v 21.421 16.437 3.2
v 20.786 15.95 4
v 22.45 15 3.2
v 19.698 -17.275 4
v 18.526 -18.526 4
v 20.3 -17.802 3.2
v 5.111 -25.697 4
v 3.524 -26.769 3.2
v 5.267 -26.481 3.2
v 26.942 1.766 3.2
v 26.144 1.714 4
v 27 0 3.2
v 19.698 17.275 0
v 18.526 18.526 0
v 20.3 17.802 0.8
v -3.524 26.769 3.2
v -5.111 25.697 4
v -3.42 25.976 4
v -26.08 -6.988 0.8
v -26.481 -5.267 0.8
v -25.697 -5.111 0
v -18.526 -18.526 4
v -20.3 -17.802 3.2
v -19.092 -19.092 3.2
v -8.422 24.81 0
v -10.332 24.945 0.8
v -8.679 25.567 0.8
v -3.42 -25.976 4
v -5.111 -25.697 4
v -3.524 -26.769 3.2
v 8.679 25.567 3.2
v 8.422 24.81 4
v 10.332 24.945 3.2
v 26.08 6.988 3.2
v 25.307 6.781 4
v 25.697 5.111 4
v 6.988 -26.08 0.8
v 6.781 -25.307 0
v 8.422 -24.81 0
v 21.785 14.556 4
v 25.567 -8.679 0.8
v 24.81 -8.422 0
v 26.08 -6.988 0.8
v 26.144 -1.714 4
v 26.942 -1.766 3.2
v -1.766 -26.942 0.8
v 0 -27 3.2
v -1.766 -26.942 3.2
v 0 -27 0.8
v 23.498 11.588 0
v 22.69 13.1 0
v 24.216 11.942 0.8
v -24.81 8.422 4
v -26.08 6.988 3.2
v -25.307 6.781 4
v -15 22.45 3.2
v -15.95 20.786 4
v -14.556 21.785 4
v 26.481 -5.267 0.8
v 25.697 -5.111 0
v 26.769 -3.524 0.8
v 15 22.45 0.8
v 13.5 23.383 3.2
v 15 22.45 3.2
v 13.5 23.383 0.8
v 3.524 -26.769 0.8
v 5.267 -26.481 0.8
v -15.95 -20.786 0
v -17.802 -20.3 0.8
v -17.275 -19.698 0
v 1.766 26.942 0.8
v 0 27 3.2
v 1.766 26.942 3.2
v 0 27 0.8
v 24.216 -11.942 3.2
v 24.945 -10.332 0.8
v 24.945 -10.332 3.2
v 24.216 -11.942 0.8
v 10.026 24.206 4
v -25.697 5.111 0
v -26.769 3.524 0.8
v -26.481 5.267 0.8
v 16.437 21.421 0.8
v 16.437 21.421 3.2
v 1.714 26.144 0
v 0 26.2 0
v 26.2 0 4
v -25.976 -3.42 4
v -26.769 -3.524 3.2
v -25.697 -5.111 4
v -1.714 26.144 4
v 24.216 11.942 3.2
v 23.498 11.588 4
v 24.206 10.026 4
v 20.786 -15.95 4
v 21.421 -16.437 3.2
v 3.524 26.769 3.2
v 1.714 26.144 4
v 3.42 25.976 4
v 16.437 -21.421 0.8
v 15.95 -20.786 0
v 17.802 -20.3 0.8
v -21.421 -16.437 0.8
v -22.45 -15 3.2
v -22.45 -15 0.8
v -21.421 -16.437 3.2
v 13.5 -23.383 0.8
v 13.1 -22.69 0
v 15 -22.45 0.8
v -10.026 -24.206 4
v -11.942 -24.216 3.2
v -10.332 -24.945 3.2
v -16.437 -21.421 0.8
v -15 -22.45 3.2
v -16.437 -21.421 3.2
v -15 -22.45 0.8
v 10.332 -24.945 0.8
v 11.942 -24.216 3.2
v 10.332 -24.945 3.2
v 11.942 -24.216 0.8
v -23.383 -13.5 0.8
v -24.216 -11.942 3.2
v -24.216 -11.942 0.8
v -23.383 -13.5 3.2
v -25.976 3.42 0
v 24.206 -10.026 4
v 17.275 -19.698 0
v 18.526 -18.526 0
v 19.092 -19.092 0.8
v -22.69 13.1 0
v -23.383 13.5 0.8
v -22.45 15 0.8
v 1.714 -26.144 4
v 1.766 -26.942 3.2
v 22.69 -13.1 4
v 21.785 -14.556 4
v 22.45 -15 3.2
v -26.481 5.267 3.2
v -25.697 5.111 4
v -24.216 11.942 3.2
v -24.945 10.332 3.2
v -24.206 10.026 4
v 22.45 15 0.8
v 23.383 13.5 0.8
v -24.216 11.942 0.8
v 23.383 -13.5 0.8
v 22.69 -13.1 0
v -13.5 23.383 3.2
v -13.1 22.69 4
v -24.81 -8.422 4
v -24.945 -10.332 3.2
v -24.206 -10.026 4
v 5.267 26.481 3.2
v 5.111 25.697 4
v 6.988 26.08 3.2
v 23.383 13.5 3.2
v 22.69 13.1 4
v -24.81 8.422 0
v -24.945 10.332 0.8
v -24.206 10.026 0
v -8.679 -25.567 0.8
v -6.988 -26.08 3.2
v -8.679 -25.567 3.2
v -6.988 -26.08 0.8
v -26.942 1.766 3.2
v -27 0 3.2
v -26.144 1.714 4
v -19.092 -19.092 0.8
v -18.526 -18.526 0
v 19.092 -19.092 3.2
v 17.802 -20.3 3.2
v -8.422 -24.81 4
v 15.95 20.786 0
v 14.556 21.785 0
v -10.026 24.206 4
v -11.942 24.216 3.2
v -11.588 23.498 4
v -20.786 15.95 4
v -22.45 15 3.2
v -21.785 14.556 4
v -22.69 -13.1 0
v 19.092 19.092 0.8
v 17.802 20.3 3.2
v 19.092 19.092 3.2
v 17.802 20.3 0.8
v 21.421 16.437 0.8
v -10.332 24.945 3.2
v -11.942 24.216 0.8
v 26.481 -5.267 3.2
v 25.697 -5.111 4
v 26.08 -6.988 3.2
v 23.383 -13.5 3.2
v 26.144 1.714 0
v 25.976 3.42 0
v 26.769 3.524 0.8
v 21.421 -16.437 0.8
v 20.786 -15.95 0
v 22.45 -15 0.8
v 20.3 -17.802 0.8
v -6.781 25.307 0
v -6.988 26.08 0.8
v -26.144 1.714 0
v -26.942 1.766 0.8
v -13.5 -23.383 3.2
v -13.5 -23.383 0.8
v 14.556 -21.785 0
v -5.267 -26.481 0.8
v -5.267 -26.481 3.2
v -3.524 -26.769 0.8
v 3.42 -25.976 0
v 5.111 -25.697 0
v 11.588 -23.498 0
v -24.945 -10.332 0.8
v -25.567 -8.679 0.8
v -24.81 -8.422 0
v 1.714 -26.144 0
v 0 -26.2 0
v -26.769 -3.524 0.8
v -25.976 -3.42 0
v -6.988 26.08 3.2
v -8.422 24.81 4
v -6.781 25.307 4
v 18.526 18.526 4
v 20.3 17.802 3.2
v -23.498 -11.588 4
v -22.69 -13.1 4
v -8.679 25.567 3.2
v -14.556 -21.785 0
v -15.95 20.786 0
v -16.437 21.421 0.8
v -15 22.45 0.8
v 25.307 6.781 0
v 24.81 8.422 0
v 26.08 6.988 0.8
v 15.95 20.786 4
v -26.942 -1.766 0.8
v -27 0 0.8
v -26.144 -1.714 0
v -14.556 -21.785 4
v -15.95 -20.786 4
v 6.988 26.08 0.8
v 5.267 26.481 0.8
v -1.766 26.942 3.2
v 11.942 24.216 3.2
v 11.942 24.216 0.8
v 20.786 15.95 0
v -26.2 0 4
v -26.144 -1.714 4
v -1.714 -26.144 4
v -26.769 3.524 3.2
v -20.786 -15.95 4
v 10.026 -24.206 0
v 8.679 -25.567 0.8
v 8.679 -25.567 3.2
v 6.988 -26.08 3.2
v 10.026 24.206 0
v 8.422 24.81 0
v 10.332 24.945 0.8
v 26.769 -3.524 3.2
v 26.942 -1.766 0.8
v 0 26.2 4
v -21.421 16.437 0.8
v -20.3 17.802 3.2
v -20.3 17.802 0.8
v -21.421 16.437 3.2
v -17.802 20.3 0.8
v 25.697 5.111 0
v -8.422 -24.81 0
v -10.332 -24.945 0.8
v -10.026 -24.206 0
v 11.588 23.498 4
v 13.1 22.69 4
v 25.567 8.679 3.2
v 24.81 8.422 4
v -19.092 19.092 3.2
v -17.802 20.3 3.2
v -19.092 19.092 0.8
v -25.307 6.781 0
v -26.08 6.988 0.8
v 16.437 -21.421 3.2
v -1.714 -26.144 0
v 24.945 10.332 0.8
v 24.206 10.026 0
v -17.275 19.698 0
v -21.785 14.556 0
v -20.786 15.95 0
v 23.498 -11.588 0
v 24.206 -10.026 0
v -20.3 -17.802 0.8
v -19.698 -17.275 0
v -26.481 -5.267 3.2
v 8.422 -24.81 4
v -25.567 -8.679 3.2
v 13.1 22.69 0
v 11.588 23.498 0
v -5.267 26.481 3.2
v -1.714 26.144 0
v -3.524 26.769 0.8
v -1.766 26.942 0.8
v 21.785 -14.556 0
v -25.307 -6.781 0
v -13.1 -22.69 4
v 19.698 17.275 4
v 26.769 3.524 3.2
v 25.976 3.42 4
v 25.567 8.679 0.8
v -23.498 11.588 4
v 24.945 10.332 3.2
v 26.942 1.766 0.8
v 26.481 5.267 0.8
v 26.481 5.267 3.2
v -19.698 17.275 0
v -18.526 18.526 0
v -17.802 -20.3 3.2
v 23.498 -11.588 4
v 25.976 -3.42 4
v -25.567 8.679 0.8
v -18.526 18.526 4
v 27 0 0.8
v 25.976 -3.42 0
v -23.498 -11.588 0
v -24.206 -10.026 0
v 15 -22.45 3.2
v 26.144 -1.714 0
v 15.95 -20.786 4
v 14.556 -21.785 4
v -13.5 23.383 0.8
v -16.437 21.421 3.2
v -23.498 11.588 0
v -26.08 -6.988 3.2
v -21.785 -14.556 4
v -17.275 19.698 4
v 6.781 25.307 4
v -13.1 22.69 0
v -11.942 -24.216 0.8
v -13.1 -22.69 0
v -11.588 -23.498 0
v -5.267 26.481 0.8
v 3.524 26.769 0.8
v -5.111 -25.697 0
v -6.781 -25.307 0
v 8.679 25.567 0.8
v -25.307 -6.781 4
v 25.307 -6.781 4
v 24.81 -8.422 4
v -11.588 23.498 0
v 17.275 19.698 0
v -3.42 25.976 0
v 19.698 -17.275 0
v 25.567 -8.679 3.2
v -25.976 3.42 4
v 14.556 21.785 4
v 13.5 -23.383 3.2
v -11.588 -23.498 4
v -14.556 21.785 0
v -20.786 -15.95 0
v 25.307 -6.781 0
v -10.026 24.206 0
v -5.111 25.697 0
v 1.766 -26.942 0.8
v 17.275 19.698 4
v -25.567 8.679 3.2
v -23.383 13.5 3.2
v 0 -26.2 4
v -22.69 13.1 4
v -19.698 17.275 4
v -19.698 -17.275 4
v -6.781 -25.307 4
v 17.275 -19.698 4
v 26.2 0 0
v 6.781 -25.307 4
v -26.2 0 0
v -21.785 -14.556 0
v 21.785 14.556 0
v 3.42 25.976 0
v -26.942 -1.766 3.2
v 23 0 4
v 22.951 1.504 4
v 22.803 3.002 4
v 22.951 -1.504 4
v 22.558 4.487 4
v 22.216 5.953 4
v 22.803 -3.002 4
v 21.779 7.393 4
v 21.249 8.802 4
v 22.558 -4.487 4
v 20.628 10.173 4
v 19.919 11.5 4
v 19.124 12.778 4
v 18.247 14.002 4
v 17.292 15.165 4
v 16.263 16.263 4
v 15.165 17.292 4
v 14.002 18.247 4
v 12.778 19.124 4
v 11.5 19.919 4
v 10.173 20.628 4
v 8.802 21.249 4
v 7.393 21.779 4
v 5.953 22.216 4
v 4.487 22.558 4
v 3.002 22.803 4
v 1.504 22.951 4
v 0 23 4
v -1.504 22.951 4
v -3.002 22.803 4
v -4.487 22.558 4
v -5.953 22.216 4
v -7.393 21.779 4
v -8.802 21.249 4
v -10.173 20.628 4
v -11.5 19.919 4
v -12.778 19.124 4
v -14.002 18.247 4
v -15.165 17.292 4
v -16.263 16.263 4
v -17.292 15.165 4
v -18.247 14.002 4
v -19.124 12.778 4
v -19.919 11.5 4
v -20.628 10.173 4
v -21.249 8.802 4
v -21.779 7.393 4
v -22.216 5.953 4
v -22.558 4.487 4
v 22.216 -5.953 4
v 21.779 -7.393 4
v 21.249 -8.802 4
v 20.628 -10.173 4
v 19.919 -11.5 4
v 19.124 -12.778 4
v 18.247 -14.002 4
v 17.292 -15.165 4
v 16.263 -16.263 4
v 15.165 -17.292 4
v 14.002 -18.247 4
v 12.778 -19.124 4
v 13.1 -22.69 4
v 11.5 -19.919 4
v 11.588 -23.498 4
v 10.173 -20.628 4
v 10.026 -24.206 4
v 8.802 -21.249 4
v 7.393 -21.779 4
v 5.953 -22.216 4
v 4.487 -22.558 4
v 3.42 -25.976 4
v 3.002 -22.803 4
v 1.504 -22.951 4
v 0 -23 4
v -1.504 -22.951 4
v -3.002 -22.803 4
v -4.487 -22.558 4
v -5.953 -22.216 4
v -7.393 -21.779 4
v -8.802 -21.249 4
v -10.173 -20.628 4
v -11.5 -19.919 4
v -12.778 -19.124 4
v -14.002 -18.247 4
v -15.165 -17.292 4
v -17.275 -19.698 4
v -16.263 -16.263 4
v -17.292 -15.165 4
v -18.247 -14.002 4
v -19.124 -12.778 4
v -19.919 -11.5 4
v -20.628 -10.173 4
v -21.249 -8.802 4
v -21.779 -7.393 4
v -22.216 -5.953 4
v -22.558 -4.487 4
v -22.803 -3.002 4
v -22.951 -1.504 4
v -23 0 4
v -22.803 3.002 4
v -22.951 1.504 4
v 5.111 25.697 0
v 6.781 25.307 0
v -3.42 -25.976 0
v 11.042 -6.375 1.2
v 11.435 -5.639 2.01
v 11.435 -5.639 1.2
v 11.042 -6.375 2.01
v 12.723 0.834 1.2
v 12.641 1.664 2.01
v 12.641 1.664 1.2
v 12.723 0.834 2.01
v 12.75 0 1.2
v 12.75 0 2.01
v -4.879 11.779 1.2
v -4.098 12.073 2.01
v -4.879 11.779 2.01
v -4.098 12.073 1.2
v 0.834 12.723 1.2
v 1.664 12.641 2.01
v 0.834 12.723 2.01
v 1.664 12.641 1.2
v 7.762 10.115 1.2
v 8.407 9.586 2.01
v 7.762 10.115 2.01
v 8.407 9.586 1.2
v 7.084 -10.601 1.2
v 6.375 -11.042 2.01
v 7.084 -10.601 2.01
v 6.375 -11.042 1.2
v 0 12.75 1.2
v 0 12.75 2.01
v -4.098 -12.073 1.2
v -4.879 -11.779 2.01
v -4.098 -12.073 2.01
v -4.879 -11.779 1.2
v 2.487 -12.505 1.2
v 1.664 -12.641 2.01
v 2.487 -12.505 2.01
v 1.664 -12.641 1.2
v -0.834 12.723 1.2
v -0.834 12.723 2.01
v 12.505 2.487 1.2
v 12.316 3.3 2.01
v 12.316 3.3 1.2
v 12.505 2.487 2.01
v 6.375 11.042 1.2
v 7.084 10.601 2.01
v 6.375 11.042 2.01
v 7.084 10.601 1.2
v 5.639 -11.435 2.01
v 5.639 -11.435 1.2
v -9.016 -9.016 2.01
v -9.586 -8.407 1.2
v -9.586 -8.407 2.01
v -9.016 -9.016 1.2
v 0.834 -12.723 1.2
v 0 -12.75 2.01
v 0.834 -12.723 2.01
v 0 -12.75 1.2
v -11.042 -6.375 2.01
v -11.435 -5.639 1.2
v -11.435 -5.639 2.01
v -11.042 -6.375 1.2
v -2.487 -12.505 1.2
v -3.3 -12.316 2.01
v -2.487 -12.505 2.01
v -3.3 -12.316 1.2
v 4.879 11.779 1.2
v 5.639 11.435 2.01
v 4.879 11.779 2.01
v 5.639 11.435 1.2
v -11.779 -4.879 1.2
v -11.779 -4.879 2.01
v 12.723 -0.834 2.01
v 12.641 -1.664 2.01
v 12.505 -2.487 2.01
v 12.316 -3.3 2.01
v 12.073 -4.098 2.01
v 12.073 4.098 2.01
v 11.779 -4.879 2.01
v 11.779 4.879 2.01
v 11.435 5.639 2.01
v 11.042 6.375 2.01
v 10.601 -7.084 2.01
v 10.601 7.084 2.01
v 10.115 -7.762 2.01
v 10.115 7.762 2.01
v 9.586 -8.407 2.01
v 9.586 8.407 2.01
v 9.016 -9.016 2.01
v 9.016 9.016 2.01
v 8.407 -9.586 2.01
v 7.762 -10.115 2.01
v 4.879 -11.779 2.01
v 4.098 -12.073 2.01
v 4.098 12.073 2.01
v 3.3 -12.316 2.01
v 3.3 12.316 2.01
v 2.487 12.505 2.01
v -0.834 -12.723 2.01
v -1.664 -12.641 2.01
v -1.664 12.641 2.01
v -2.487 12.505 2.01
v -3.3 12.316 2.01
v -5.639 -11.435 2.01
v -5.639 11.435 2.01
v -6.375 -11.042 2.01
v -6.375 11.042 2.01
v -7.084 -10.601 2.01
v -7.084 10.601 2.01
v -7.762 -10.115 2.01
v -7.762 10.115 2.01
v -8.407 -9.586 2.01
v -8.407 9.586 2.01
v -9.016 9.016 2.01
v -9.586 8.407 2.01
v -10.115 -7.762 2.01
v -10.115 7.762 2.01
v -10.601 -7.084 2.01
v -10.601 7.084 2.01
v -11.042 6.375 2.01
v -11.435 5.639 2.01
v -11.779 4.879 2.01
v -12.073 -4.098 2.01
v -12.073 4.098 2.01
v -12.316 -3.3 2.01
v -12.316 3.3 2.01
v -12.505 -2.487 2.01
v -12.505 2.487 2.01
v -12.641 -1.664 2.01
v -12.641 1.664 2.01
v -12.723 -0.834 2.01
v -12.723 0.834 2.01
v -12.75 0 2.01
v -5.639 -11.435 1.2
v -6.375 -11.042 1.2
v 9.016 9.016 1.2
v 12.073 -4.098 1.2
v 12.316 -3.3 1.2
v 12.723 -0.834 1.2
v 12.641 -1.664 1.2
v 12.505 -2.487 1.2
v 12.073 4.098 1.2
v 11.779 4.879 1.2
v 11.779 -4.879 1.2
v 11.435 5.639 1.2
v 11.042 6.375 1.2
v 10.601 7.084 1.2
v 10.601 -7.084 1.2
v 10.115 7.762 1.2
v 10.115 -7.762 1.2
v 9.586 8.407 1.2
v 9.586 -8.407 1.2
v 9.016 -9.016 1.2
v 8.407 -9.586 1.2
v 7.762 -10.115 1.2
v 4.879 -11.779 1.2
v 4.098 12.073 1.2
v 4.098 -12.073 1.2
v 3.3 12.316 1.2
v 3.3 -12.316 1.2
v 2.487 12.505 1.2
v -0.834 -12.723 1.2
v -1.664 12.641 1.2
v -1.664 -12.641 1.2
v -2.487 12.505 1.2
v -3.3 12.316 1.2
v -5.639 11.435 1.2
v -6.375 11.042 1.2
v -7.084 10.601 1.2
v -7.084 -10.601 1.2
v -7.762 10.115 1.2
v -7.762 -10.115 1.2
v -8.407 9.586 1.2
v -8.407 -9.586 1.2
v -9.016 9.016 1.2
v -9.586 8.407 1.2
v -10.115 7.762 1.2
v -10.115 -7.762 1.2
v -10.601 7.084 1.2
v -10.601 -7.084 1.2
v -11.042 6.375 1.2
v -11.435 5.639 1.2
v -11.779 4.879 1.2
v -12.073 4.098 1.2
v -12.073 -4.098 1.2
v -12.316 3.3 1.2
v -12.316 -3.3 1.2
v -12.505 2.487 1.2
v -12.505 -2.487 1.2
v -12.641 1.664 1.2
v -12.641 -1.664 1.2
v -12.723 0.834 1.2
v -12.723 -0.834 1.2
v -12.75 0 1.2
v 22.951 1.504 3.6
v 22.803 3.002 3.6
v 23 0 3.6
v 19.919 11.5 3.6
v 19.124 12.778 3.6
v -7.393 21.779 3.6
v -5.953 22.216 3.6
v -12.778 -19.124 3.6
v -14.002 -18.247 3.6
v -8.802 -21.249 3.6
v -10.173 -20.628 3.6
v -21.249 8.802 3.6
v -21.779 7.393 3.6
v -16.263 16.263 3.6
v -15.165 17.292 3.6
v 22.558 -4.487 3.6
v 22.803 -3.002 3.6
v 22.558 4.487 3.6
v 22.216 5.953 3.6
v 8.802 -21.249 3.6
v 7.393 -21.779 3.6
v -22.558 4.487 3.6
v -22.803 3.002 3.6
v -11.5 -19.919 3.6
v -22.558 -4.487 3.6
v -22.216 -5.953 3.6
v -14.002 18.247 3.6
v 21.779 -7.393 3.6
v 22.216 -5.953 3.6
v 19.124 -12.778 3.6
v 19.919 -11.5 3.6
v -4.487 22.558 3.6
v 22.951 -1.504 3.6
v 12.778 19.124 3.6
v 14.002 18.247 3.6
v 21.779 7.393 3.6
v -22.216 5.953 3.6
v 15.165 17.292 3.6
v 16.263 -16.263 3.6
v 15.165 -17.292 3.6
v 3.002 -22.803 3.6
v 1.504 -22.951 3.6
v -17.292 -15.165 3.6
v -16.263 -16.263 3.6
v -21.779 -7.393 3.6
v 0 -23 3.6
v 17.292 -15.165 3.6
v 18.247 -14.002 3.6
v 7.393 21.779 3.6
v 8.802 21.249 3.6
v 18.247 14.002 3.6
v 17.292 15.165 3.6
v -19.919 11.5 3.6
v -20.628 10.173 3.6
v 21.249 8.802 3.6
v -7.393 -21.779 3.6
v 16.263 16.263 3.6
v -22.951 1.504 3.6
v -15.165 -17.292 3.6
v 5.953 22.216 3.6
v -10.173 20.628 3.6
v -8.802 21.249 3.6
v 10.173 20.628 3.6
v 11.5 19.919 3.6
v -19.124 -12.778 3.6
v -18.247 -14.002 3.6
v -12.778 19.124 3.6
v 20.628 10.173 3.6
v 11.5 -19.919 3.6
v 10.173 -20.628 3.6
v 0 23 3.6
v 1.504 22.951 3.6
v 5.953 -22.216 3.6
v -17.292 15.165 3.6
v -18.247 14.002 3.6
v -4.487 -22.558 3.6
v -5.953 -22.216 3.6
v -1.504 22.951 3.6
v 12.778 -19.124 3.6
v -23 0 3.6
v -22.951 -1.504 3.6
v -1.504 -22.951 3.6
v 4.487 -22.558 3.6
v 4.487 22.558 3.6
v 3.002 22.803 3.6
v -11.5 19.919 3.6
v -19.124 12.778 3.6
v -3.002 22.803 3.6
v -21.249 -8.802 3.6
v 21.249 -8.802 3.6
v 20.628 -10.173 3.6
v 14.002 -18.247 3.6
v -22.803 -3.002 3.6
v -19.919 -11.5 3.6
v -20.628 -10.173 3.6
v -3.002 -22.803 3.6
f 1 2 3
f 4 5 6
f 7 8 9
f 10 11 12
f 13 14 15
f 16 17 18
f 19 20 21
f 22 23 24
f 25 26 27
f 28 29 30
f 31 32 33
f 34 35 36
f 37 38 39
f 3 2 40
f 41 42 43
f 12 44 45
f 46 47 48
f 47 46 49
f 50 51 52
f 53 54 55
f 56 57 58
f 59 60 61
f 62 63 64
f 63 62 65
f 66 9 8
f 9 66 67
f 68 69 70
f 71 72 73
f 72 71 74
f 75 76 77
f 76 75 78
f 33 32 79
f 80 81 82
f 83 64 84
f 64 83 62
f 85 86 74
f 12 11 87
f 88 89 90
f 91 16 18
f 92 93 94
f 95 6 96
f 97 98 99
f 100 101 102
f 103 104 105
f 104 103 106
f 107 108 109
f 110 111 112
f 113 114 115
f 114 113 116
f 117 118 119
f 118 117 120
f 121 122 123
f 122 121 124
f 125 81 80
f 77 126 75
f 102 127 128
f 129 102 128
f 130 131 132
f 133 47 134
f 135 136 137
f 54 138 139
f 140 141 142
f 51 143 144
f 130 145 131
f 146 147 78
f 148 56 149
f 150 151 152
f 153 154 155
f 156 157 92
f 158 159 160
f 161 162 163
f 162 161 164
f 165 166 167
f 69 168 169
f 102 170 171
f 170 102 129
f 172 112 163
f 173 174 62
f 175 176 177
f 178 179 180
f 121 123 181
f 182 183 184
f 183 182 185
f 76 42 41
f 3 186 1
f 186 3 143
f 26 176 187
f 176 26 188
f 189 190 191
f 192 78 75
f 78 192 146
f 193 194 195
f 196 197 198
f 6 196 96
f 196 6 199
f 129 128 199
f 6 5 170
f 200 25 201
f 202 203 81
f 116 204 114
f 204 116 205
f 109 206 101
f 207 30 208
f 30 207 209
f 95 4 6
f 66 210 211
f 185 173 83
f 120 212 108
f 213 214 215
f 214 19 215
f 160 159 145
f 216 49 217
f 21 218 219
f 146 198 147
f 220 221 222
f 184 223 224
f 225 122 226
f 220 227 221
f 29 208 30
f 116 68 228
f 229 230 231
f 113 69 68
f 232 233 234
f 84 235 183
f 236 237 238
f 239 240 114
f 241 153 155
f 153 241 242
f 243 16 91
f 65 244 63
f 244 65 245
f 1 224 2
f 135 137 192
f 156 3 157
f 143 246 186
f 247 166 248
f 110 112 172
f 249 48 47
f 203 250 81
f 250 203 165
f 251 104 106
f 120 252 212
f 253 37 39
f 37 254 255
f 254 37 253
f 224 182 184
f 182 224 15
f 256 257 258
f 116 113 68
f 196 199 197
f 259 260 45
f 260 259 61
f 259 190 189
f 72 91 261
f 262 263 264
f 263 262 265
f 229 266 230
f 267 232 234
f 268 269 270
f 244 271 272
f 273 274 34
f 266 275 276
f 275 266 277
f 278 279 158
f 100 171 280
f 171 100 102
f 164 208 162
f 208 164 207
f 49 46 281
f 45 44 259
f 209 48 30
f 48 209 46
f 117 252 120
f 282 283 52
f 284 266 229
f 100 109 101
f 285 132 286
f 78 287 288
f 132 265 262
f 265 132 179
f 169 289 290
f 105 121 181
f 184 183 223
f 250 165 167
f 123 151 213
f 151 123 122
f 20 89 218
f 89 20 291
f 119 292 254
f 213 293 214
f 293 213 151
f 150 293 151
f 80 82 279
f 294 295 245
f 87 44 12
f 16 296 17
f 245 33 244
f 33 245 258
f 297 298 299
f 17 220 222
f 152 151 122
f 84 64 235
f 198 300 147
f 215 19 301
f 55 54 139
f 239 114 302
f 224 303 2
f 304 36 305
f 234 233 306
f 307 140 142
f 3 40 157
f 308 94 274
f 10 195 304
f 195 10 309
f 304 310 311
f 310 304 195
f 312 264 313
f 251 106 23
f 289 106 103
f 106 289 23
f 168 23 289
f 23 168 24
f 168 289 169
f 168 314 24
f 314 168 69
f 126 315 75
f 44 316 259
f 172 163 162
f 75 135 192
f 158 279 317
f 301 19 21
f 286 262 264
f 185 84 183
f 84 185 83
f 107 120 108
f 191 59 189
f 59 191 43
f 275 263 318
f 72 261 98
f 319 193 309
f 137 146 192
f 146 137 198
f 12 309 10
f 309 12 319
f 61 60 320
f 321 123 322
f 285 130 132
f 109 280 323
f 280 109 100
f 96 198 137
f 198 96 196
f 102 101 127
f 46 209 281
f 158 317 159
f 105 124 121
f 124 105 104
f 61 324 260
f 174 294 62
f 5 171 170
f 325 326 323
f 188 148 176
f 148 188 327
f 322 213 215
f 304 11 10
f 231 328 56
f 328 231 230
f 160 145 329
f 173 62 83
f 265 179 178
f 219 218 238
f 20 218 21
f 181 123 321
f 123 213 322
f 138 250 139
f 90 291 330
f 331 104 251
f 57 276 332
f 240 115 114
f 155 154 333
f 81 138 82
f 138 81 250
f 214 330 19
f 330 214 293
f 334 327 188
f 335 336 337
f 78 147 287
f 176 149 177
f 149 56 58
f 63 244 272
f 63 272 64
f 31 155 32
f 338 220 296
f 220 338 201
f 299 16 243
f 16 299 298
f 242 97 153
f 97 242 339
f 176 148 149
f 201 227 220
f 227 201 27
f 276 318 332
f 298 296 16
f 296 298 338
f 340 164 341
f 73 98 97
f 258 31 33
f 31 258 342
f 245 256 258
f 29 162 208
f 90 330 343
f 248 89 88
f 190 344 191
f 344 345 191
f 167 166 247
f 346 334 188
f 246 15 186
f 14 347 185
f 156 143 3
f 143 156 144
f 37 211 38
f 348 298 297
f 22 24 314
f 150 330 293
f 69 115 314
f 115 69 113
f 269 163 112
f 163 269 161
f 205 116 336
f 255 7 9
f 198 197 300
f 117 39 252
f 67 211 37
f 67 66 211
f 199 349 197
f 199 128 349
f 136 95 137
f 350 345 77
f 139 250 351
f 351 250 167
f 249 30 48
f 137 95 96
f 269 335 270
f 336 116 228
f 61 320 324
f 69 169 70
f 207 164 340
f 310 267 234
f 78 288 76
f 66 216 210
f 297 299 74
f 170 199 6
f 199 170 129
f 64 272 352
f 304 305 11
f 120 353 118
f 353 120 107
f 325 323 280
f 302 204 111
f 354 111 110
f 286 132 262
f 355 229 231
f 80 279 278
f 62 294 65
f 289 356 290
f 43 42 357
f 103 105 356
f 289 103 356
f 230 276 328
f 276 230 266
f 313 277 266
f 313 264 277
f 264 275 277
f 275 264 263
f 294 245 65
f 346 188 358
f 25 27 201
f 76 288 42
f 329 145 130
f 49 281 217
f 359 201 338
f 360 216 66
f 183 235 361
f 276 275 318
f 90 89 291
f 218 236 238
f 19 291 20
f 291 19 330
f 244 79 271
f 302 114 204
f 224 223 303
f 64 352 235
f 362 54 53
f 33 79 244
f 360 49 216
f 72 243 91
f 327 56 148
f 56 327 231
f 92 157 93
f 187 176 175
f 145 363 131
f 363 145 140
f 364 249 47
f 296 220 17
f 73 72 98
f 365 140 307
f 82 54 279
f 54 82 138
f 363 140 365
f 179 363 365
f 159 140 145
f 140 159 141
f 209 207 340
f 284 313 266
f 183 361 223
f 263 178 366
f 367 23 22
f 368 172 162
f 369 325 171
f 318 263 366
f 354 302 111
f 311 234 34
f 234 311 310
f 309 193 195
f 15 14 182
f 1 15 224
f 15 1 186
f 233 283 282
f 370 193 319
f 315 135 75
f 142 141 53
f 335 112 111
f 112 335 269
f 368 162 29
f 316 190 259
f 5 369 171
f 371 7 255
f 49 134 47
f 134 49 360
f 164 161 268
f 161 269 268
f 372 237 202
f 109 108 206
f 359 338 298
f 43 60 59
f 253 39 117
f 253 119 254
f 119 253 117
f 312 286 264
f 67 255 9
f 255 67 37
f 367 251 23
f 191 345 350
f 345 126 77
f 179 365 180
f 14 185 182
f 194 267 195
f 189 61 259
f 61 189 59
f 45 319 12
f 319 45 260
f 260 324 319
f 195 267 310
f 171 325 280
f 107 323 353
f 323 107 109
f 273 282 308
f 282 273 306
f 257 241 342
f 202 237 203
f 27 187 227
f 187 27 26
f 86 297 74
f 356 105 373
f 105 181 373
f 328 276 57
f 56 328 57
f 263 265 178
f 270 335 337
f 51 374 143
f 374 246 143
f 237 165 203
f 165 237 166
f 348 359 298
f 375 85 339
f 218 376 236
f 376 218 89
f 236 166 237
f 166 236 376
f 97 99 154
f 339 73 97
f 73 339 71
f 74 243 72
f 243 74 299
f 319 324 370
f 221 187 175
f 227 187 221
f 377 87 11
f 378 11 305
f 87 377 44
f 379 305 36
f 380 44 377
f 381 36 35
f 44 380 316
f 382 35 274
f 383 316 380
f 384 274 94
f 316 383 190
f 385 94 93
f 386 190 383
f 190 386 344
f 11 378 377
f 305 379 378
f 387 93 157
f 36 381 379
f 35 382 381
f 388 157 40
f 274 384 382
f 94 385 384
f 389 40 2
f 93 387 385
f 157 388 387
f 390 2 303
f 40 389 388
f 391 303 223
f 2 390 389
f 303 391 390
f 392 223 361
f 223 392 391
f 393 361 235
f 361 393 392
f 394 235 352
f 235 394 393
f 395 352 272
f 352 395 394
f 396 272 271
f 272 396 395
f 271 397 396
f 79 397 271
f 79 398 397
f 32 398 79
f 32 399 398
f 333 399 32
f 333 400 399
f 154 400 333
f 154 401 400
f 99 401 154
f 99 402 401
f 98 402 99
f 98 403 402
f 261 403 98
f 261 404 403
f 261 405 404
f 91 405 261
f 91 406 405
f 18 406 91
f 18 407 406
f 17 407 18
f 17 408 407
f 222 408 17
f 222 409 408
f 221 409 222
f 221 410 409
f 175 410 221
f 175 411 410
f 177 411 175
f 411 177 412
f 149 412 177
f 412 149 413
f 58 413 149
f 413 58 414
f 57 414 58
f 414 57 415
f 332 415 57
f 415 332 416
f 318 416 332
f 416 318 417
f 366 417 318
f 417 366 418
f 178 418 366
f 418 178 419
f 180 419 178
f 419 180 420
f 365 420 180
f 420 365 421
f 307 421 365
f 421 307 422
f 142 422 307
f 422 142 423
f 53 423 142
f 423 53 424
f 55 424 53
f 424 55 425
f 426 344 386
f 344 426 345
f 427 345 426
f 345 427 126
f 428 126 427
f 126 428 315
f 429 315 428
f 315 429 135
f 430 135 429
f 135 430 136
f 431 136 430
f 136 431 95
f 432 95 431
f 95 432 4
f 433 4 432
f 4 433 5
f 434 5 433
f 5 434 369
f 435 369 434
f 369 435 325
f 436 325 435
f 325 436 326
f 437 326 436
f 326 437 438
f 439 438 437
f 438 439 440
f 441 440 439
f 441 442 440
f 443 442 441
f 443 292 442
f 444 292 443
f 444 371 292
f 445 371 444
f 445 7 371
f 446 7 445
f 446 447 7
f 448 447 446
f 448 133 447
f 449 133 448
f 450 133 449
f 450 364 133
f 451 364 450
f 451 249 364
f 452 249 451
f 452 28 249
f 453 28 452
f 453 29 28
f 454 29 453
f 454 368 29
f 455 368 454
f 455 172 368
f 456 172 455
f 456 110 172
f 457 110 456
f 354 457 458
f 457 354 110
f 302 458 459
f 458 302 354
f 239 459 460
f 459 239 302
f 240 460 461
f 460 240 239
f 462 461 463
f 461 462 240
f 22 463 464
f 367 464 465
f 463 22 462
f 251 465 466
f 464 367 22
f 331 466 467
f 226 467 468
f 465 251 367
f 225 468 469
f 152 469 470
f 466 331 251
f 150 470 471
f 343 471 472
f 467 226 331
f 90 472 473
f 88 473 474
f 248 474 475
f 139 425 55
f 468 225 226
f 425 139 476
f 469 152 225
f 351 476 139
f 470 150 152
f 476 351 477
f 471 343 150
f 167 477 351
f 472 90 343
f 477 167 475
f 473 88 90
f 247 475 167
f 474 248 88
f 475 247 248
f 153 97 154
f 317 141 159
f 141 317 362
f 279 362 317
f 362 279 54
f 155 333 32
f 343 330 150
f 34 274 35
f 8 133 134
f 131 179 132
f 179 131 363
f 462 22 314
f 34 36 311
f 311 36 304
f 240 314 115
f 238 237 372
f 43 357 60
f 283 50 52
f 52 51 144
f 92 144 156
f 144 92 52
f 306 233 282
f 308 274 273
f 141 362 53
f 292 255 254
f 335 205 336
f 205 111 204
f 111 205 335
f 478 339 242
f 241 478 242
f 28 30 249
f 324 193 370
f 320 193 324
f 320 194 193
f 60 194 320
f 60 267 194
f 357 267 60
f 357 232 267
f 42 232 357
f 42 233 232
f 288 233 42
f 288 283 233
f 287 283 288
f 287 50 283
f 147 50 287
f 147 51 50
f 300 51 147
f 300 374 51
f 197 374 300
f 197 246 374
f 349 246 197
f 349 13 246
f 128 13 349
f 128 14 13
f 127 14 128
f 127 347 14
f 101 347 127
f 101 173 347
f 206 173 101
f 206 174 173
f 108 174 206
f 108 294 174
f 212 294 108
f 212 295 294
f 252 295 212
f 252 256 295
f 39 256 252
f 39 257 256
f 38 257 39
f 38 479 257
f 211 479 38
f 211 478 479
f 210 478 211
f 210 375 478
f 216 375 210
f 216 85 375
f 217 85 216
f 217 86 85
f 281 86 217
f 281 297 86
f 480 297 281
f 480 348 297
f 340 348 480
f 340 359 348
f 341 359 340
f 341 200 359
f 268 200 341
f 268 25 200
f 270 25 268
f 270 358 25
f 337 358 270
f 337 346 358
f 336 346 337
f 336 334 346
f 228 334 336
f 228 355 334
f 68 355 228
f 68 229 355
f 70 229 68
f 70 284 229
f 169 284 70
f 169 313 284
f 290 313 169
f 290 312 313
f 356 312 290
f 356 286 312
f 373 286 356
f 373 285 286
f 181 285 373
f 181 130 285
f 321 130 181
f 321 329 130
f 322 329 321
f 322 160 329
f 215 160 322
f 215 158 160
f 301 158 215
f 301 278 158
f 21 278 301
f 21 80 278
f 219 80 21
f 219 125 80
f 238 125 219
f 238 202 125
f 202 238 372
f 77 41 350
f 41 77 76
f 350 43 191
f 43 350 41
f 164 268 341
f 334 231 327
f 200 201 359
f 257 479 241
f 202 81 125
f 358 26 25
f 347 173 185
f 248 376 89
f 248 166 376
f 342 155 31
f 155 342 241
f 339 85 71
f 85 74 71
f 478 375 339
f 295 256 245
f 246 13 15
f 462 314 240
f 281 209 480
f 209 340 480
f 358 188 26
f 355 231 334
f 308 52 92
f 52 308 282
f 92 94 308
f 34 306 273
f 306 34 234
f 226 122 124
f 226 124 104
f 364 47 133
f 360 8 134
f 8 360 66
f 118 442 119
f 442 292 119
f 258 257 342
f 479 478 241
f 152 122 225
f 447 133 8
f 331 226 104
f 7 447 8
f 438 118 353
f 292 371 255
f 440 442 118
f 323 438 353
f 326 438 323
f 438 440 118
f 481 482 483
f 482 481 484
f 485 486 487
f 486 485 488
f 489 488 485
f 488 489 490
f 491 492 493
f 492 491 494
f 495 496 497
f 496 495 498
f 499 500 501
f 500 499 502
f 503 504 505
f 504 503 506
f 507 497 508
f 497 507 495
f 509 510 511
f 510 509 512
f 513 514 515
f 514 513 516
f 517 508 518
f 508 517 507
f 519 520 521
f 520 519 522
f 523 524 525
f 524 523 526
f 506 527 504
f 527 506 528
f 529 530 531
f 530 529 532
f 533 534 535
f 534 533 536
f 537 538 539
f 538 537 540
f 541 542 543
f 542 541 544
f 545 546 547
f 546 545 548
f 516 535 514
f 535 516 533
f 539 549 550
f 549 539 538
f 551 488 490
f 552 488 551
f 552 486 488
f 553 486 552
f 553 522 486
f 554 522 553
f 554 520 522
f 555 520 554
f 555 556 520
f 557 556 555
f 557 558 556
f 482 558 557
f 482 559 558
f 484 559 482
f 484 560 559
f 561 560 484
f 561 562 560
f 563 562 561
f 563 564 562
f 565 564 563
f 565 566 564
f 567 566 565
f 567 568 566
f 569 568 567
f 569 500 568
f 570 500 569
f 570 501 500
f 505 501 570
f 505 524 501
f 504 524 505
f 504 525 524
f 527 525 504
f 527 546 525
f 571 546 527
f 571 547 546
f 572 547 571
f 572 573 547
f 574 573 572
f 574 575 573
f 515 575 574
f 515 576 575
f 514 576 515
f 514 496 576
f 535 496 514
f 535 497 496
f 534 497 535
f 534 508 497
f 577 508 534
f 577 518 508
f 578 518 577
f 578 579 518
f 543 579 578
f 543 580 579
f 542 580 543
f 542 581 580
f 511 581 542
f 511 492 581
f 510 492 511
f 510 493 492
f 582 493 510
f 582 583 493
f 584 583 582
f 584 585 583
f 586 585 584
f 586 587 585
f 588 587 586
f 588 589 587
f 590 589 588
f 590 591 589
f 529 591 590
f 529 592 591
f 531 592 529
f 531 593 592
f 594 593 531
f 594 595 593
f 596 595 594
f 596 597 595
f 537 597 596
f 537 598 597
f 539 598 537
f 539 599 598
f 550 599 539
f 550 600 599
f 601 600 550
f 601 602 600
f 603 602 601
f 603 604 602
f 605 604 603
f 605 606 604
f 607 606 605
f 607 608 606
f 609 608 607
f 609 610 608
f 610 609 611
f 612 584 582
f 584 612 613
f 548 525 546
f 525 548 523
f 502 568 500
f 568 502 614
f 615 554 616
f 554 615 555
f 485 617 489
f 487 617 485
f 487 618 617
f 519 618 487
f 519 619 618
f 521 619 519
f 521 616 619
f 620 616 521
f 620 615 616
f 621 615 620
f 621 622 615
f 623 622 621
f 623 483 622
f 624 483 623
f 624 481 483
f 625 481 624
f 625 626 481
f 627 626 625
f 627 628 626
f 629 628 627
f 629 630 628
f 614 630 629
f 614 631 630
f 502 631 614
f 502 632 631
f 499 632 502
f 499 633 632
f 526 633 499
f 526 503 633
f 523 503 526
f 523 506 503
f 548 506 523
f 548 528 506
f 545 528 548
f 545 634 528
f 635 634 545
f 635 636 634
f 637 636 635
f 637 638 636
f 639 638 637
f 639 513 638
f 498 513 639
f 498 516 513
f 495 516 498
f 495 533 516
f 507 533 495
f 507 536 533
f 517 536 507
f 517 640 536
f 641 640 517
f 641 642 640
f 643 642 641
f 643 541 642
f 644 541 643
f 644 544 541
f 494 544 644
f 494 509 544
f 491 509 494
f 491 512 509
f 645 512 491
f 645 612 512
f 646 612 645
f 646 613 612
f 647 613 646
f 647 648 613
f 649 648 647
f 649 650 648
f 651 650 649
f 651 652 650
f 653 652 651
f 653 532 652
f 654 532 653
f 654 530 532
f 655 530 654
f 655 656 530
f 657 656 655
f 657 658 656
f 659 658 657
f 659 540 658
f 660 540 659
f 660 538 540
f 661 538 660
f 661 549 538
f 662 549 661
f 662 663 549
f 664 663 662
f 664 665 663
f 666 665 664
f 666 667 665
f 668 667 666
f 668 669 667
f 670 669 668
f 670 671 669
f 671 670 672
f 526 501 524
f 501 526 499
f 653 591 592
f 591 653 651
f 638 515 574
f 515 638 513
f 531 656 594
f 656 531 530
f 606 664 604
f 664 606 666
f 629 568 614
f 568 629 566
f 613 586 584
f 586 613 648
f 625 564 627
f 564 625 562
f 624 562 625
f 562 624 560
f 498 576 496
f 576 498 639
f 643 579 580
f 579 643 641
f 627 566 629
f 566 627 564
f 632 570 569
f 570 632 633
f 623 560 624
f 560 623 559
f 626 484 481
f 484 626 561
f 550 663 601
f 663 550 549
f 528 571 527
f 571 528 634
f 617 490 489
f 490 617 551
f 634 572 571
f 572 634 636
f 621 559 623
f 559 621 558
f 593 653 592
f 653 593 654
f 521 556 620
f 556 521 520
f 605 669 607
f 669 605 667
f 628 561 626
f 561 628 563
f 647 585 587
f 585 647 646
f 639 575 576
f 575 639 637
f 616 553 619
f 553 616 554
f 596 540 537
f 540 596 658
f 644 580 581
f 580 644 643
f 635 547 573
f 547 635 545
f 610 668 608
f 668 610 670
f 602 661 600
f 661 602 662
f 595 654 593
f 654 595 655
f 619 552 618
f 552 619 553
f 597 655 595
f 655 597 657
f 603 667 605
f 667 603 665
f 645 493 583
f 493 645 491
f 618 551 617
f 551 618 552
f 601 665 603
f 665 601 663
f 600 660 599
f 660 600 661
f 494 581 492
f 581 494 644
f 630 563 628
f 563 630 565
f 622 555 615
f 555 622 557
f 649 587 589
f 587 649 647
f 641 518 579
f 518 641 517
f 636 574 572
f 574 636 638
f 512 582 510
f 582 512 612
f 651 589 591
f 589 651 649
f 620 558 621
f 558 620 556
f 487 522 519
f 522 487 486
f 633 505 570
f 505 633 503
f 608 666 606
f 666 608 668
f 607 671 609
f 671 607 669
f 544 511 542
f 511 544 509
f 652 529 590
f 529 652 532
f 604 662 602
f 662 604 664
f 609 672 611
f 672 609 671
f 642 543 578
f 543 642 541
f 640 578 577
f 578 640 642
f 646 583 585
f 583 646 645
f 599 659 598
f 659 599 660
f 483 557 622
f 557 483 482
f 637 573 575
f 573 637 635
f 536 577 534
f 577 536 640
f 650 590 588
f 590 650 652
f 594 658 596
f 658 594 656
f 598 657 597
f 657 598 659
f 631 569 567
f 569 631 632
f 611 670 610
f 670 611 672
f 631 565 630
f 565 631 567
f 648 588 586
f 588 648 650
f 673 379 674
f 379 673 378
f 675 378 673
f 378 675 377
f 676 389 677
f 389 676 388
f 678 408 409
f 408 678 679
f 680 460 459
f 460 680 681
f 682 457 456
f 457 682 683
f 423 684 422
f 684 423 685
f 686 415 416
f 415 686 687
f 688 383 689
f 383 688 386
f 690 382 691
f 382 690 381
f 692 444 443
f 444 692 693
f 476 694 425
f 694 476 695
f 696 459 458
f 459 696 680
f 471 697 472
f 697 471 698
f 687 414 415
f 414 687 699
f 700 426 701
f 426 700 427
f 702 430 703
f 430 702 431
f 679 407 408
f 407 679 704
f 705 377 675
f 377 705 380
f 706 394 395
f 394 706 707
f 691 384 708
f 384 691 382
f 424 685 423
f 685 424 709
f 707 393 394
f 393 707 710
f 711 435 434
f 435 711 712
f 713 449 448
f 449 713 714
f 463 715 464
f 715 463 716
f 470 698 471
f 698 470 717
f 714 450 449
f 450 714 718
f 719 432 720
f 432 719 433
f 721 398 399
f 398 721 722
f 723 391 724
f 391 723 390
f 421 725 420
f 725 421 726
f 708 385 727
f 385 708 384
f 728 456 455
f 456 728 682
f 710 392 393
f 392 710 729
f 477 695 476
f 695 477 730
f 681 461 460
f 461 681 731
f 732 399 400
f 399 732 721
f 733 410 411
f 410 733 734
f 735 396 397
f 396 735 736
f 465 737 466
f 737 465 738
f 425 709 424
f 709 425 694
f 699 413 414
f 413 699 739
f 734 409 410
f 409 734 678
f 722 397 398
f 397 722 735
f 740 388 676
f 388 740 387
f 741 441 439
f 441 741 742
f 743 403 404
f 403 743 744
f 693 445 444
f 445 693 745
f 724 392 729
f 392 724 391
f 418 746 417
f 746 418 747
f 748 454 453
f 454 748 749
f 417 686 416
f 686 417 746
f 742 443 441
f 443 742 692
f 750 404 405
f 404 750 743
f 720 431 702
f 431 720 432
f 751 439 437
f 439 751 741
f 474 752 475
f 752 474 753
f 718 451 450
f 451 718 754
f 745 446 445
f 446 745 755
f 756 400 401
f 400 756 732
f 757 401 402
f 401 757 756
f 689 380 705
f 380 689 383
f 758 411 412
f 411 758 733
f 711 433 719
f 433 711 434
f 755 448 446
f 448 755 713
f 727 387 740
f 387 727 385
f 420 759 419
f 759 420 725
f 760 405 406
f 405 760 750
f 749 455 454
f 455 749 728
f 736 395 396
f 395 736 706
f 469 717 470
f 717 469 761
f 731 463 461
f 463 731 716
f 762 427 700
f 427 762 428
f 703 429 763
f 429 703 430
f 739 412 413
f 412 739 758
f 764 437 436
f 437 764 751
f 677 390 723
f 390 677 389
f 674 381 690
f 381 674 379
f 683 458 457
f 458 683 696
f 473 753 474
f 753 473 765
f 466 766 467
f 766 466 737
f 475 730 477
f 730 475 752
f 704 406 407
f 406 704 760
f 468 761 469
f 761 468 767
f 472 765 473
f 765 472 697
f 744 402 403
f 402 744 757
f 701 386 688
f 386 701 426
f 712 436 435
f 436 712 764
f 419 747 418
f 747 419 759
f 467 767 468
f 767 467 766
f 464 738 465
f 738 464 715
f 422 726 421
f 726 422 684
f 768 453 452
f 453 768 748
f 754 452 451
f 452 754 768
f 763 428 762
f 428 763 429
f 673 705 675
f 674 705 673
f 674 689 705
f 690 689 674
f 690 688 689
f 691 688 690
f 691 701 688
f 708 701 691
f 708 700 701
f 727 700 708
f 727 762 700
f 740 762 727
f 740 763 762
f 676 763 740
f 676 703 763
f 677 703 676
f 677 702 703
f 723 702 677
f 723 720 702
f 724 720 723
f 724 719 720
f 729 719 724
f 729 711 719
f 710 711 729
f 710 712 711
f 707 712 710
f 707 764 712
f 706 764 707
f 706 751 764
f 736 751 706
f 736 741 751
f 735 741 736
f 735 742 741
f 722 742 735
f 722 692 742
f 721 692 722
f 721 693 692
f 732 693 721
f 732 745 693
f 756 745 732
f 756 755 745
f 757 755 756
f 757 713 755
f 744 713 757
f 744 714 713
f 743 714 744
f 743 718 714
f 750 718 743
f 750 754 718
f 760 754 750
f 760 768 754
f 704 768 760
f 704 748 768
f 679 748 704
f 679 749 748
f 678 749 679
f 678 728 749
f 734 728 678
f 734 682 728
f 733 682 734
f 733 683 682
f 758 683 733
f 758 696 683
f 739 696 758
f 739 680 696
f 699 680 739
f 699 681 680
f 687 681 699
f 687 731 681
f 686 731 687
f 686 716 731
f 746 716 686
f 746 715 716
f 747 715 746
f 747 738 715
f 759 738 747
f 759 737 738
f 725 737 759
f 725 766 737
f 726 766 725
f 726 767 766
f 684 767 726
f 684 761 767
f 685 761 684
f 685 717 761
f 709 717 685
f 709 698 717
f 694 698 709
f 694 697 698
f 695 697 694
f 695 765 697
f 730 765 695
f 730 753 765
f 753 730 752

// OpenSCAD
// file: params.scad
// Shared dimensions (mm). Disc and enclosure both read these, so changing the
// disc size here resizes the slot too.

$fn = 96;

// --- Disc ---
disc_d = 54;          // diameter
disc_t = 4;           // thickness
disc_chamfer = 0.8;   // edge chamfer, kinder to small hands

// 25 mm round NTAG213/215 sticker. Measure yours.
tag_d = 25.5;
tag_pocket = 0.8;     // pocket depth (sticker + adhesive is ~0.3-0.5)

// Recess on the front for a printed picture sticker.
label_d = 46;
label_depth = 0.4;

// --- Printer ---
fit = 0.6;            // clearance for parts that slide together
// main file
// Music disc. Print flat, no supports.
//
// embed_tag = false: the tag pocket is open on the back; stick the tag in and
//                    cover it with the back-side label or a dab of glue.
// embed_tag = true:  the pocket is sealed inside the disc. Pause the print at
//                    the height printed in the console, drop the tag in, resume.
//                    Toddler-proof: the tag cannot be peeled off.

include <params.scad>

embed_tag = true;
floor_t = 1.2;  // plastic under an embedded tag

module chamfered_cylinder(d, h, c) {
  hull() {
    translate([0, 0, c]) cylinder(d = d, h = h - 2 * c);
    cylinder(d = d - 2 * c, h = h);
  }
}

module disc() {
  pocket_z = embed_tag ? floor_t : -0.01;
  difference() {
    chamfered_cylinder(disc_d, disc_t, disc_chamfer);
    translate([0, 0, pocket_z]) cylinder(d = tag_d, h = tag_pocket + 0.01);
    translate([0, 0, disc_t - label_depth]) cylinder(d = label_d, h = label_depth + 0.01);
  }
}

assert(!embed_tag || floor_t + tag_pocket + label_depth + 0.8 <= disc_t,
       "Disc too thin to embed the tag");
if (embed_tag) echo(str("Pause print at Z = ", floor_t + tag_pocket, " mm to insert the tag"));

disc();
